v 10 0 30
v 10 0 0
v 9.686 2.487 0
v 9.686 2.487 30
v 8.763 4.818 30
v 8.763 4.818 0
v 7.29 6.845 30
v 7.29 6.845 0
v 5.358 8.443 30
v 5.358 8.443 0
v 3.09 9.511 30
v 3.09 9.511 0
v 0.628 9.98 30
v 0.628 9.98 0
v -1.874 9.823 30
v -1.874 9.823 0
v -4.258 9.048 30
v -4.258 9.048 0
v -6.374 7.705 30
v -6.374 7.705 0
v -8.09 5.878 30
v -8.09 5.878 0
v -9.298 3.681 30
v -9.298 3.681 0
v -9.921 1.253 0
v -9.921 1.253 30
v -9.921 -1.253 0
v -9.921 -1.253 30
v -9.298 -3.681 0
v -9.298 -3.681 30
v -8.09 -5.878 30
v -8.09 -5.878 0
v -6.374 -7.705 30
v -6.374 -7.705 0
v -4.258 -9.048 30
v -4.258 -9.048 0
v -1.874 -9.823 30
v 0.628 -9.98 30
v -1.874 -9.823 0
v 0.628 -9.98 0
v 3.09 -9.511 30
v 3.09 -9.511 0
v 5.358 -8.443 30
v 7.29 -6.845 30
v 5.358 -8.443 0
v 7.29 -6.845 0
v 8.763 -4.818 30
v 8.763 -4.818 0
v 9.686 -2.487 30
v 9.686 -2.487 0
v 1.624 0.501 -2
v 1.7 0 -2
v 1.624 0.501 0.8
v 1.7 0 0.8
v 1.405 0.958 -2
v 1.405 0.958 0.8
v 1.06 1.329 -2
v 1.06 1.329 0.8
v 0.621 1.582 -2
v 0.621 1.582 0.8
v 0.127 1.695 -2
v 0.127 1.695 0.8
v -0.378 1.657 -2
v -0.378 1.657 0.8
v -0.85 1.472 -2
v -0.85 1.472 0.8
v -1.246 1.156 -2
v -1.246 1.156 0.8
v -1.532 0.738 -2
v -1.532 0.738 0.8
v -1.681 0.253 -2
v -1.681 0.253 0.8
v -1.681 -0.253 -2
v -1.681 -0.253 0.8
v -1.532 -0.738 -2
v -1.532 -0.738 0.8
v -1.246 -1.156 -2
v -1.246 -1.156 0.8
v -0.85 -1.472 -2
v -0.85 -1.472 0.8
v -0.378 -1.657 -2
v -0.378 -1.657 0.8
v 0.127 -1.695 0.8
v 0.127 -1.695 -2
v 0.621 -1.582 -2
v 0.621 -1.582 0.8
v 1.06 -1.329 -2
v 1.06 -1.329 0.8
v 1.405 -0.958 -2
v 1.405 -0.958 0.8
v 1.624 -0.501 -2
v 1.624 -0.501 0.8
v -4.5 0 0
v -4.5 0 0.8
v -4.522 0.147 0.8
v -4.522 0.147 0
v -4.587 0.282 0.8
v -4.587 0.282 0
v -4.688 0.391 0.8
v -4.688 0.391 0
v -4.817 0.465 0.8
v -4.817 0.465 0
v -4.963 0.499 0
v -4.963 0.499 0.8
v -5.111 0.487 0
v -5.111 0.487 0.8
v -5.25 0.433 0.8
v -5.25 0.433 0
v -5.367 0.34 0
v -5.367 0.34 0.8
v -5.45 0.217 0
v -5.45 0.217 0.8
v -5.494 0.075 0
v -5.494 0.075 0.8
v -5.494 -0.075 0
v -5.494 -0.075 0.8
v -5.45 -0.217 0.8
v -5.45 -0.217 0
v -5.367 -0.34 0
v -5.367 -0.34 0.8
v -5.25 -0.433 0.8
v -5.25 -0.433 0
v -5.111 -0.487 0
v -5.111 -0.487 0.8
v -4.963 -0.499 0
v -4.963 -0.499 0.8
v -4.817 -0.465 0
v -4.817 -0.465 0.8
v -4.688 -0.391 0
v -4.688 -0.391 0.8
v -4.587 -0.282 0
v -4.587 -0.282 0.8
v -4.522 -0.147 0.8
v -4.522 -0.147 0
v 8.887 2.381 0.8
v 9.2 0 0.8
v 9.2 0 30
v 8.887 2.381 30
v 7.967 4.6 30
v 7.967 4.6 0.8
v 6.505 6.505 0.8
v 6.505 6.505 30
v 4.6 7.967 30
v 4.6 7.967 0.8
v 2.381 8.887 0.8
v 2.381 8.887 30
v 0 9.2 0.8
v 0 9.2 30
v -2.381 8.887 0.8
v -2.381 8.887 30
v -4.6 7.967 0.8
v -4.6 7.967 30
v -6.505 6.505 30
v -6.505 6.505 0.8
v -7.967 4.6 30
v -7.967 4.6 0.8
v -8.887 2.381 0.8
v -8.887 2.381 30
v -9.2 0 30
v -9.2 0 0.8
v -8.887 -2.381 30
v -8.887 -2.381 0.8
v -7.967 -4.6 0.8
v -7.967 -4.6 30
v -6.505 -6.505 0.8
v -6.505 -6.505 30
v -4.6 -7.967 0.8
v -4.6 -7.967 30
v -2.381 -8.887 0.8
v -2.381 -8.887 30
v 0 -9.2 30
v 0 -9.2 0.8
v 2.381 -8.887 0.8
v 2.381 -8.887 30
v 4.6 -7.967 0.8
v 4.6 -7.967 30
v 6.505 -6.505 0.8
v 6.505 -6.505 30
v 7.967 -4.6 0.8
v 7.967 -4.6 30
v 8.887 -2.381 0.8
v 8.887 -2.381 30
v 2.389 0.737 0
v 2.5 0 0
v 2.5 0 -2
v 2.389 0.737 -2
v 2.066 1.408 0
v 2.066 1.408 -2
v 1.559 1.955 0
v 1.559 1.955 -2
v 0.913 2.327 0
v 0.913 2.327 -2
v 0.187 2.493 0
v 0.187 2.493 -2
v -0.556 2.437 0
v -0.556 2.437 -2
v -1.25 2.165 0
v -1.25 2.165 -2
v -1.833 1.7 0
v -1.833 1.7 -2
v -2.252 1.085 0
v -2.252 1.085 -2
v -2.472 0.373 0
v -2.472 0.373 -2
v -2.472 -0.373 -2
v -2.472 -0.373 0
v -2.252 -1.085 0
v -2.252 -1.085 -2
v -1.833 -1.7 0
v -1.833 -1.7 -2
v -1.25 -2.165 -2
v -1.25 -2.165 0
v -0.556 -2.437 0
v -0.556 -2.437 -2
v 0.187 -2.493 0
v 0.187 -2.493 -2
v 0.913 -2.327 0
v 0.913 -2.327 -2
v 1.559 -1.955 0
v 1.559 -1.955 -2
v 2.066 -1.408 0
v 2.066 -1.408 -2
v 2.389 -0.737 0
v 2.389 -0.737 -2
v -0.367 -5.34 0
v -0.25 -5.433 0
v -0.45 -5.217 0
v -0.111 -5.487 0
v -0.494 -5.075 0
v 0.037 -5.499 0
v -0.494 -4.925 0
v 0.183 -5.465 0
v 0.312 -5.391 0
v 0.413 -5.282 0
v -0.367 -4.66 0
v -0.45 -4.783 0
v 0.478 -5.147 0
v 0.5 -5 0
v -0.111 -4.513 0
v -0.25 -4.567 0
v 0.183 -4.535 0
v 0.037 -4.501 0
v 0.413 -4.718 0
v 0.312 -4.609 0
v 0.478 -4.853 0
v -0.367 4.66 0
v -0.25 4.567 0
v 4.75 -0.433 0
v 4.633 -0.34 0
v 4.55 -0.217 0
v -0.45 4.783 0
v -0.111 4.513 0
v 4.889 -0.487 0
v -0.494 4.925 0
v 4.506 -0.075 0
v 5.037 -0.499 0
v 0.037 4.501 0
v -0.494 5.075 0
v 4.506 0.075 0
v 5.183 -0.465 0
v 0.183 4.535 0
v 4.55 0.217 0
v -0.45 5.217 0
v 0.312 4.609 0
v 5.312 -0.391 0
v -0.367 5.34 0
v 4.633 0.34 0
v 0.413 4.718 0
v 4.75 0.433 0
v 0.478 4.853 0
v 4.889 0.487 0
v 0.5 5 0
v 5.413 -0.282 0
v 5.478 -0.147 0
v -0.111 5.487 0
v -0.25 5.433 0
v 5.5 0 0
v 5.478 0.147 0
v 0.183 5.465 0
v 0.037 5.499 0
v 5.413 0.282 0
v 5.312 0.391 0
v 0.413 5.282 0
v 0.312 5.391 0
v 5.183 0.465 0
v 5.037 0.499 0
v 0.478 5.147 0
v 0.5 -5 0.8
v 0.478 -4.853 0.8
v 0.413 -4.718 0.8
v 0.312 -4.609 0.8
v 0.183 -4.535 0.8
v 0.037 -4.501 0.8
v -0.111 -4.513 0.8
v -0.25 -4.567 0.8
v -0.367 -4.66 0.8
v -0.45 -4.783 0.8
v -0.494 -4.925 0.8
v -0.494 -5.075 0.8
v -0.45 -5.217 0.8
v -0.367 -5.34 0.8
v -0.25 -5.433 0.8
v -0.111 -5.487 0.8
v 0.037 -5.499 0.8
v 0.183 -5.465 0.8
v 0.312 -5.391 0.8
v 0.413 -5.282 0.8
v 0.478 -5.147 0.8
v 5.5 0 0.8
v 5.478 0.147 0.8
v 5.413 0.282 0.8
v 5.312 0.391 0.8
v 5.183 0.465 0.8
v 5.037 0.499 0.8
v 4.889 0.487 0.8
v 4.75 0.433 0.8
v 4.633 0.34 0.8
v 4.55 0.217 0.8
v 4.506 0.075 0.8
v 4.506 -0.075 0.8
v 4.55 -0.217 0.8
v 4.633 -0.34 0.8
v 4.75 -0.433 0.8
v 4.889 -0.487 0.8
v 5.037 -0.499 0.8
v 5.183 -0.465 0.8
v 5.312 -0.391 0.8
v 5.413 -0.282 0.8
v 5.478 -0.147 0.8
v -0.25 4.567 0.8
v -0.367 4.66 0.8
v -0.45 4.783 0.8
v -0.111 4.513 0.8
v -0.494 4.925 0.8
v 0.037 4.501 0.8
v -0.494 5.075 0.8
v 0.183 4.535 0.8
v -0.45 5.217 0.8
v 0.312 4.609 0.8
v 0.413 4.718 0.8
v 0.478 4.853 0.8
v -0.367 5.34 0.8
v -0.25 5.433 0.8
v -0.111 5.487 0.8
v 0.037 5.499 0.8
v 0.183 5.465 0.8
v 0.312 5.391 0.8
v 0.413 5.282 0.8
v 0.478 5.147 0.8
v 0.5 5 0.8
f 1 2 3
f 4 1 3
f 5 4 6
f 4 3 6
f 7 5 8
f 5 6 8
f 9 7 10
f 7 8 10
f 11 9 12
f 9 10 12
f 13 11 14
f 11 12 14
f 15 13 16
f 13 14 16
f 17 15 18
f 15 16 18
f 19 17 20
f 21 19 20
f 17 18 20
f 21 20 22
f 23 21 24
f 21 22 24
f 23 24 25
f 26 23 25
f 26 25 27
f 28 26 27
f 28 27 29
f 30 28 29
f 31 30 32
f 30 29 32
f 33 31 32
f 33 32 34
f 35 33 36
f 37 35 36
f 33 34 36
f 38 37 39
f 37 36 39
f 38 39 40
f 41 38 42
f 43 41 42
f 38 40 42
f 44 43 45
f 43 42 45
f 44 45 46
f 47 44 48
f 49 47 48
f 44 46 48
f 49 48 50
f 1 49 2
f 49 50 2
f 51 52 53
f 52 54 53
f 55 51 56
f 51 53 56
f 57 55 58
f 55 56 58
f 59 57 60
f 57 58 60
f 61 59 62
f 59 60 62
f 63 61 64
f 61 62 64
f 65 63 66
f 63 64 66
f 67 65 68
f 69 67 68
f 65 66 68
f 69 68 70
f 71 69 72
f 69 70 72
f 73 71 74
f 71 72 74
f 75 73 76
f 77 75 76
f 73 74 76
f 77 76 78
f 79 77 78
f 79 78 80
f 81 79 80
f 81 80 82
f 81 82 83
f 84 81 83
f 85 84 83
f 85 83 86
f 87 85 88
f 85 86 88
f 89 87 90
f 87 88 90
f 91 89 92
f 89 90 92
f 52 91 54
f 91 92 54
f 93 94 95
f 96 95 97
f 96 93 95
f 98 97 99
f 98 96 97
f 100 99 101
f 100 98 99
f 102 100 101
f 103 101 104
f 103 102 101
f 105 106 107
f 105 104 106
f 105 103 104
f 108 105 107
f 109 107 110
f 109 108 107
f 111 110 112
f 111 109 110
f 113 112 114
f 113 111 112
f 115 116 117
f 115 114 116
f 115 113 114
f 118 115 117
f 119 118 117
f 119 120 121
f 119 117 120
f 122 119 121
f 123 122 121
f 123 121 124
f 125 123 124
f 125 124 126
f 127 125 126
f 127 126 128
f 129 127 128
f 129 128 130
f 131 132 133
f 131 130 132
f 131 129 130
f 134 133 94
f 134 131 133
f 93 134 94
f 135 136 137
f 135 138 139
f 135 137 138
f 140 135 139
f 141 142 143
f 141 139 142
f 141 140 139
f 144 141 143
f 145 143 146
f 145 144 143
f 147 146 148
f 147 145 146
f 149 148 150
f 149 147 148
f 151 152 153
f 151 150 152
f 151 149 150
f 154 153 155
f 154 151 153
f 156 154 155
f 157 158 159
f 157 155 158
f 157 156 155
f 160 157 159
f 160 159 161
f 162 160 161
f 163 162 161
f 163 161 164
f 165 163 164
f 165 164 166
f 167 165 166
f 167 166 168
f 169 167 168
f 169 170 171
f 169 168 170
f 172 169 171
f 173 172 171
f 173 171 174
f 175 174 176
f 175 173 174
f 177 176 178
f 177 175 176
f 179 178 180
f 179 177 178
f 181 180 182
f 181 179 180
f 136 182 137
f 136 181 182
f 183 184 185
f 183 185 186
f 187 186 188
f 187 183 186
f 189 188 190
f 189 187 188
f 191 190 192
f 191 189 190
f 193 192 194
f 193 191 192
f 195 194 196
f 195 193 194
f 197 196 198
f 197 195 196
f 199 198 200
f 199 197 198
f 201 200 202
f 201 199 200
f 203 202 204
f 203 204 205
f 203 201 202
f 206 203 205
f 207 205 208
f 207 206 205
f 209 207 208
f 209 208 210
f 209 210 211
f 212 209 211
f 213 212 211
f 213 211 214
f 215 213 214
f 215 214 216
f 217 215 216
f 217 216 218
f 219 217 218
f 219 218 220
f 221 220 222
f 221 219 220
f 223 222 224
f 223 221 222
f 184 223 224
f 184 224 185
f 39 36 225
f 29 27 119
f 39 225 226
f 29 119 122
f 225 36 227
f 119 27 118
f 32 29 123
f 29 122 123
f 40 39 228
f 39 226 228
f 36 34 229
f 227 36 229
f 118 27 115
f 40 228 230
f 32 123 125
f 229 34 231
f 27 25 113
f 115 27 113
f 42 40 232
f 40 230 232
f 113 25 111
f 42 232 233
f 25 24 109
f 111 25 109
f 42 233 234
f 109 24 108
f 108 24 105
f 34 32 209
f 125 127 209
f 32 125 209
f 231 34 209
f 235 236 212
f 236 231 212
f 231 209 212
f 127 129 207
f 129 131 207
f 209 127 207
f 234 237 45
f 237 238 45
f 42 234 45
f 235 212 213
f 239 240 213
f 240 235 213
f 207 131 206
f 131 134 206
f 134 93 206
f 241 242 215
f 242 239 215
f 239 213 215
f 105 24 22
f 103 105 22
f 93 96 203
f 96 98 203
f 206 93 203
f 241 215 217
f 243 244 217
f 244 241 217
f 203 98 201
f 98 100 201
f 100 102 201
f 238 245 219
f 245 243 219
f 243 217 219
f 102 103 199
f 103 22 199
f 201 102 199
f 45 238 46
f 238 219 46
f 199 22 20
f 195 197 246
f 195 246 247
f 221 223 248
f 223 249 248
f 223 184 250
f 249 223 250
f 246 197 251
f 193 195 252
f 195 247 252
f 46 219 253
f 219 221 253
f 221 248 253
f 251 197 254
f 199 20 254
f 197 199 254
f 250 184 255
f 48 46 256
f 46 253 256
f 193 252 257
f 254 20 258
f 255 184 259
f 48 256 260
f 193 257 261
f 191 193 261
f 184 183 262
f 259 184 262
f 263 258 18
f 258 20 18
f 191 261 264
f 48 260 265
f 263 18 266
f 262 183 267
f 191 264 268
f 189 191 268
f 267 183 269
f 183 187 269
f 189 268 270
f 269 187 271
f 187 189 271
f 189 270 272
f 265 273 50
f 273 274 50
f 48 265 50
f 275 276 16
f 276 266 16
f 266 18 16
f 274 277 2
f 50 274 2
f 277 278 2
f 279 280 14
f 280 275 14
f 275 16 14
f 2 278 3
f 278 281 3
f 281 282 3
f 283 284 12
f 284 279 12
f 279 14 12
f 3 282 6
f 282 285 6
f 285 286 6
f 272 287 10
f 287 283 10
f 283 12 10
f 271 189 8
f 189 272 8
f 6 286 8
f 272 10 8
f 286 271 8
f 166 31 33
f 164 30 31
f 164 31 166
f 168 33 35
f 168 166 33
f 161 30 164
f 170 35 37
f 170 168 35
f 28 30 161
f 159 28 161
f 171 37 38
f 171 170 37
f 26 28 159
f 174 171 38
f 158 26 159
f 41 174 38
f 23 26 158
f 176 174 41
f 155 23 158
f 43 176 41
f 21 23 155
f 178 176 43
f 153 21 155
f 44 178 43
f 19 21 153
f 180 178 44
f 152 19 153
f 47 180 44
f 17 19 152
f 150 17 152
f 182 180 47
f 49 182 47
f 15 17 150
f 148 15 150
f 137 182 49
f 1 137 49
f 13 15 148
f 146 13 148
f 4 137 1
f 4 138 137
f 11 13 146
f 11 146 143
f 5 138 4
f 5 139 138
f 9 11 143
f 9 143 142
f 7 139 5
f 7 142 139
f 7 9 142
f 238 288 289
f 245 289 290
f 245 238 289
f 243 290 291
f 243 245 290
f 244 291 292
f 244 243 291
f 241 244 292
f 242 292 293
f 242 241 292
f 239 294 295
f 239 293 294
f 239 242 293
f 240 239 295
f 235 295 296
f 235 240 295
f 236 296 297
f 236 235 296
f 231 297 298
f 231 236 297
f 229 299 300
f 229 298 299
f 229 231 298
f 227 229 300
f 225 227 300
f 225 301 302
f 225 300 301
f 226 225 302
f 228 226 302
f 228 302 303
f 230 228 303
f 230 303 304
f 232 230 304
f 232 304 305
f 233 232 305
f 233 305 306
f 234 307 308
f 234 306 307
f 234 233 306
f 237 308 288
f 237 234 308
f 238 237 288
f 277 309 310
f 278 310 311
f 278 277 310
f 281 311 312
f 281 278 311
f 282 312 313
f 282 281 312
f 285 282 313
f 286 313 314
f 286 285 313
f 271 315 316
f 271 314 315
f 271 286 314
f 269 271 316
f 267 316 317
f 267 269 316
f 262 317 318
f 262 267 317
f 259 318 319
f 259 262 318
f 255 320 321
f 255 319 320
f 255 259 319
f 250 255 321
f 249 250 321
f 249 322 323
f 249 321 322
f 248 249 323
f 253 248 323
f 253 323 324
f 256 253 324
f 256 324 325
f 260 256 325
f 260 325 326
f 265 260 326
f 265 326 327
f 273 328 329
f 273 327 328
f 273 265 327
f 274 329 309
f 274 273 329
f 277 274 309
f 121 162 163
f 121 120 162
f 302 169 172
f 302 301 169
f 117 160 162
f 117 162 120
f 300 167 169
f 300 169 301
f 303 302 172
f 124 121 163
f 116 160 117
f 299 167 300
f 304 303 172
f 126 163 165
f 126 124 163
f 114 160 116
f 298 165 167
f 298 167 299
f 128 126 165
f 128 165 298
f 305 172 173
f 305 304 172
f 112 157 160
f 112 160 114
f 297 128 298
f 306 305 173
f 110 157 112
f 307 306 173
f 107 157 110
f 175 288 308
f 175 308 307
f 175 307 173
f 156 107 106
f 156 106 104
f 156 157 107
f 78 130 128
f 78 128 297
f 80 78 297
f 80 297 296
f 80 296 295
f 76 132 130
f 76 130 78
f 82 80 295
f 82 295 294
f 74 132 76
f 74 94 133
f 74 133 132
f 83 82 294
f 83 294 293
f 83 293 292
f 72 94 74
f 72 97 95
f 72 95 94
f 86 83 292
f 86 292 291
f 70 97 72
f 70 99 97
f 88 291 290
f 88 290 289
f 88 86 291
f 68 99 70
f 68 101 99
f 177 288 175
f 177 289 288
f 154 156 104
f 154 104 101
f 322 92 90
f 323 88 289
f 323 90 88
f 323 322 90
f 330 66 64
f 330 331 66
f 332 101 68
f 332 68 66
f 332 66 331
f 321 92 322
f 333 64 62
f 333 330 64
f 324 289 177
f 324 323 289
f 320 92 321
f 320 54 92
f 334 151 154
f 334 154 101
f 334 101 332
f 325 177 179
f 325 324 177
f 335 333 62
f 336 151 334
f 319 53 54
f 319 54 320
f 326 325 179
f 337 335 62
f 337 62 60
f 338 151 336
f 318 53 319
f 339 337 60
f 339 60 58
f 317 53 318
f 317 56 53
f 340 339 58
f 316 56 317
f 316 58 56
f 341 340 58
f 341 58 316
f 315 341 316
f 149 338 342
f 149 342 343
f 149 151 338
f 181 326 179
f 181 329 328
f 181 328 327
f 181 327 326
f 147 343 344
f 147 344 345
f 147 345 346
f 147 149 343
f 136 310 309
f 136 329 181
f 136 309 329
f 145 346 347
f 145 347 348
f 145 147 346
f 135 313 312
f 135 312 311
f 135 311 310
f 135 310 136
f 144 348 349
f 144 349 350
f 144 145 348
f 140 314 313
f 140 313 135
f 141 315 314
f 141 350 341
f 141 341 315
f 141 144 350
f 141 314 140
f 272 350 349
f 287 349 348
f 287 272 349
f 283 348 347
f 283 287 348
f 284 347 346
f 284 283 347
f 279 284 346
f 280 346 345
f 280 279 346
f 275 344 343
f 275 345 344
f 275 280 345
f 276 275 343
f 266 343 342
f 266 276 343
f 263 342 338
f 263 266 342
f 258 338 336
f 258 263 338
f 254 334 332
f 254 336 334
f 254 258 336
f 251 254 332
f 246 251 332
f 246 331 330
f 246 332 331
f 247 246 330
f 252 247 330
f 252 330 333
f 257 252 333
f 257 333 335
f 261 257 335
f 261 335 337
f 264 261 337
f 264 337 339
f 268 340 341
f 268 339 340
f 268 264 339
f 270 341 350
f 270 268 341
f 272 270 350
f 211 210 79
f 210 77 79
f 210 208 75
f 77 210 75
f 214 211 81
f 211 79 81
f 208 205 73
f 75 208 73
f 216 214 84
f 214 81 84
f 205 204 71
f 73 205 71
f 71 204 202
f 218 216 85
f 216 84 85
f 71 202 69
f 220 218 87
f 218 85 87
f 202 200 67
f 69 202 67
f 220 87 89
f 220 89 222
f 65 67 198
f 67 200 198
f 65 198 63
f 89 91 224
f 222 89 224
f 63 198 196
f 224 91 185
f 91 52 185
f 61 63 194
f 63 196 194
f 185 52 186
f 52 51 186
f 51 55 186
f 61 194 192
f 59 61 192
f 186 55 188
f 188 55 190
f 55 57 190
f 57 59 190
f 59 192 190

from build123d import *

# Parameters (mm, degrees)
SKETCH1_R               = 10
BOSS_EXTRUDE1_DEPTH     = 30
SKETCH2_R               = 2.5
BOSS_EXTRUDE3_DEPTH     = 2
SHELL1_T                = -0.8
SKETCH3_R               = 0.5
CUT_EXTRUDE2_DEPTH      = 34.166247904
CUT_EXTRUDE2_DEPTH_BACK = 34.166247904


with BuildPart() as part:
    # Sketch1 → Boss-Extrude1 (new body)
    with BuildSketch(Plane.XY):
        Circle(SKETCH1_R)
    extrude(amount=BOSS_EXTRUDE1_DEPTH)

    # Sketch2 → Boss-Extrude3 (add)
    with BuildSketch(Plane.XY):
        Circle(SKETCH2_R)
    extrude(amount=-BOSS_EXTRUDE3_DEPTH)

    # Shell1
    shell1_openings = [part.faces().sort_by_distance(p)[0] for p in [
        (0, 0, 30),
        (0, 0, -2),
    ]]
    offset(amount=SHELL1_T, openings=shell1_openings, kind=Kind.INTERSECTION)

    # Sketch3 → Cut-Extrude2 (cut, two sides)
    with BuildSketch(Plane.XY) as cut_extrude2_sk:
        with Locations((5, 0)):
            Circle(SKETCH3_R)
        with Locations((0, -5)):
            Circle(SKETCH3_R)
        with Locations((-5, 0)):
            Circle(SKETCH3_R)
        with Locations((0, 5)):
            Circle(SKETCH3_R)
    extrude(amount=CUT_EXTRUDE2_DEPTH, mode=Mode.SUBTRACT)
    extrude(cut_extrude2_sk.sketch, amount=-CUT_EXTRUDE2_DEPTH_BACK, mode=Mode.SUBTRACT)


solid = part.part
